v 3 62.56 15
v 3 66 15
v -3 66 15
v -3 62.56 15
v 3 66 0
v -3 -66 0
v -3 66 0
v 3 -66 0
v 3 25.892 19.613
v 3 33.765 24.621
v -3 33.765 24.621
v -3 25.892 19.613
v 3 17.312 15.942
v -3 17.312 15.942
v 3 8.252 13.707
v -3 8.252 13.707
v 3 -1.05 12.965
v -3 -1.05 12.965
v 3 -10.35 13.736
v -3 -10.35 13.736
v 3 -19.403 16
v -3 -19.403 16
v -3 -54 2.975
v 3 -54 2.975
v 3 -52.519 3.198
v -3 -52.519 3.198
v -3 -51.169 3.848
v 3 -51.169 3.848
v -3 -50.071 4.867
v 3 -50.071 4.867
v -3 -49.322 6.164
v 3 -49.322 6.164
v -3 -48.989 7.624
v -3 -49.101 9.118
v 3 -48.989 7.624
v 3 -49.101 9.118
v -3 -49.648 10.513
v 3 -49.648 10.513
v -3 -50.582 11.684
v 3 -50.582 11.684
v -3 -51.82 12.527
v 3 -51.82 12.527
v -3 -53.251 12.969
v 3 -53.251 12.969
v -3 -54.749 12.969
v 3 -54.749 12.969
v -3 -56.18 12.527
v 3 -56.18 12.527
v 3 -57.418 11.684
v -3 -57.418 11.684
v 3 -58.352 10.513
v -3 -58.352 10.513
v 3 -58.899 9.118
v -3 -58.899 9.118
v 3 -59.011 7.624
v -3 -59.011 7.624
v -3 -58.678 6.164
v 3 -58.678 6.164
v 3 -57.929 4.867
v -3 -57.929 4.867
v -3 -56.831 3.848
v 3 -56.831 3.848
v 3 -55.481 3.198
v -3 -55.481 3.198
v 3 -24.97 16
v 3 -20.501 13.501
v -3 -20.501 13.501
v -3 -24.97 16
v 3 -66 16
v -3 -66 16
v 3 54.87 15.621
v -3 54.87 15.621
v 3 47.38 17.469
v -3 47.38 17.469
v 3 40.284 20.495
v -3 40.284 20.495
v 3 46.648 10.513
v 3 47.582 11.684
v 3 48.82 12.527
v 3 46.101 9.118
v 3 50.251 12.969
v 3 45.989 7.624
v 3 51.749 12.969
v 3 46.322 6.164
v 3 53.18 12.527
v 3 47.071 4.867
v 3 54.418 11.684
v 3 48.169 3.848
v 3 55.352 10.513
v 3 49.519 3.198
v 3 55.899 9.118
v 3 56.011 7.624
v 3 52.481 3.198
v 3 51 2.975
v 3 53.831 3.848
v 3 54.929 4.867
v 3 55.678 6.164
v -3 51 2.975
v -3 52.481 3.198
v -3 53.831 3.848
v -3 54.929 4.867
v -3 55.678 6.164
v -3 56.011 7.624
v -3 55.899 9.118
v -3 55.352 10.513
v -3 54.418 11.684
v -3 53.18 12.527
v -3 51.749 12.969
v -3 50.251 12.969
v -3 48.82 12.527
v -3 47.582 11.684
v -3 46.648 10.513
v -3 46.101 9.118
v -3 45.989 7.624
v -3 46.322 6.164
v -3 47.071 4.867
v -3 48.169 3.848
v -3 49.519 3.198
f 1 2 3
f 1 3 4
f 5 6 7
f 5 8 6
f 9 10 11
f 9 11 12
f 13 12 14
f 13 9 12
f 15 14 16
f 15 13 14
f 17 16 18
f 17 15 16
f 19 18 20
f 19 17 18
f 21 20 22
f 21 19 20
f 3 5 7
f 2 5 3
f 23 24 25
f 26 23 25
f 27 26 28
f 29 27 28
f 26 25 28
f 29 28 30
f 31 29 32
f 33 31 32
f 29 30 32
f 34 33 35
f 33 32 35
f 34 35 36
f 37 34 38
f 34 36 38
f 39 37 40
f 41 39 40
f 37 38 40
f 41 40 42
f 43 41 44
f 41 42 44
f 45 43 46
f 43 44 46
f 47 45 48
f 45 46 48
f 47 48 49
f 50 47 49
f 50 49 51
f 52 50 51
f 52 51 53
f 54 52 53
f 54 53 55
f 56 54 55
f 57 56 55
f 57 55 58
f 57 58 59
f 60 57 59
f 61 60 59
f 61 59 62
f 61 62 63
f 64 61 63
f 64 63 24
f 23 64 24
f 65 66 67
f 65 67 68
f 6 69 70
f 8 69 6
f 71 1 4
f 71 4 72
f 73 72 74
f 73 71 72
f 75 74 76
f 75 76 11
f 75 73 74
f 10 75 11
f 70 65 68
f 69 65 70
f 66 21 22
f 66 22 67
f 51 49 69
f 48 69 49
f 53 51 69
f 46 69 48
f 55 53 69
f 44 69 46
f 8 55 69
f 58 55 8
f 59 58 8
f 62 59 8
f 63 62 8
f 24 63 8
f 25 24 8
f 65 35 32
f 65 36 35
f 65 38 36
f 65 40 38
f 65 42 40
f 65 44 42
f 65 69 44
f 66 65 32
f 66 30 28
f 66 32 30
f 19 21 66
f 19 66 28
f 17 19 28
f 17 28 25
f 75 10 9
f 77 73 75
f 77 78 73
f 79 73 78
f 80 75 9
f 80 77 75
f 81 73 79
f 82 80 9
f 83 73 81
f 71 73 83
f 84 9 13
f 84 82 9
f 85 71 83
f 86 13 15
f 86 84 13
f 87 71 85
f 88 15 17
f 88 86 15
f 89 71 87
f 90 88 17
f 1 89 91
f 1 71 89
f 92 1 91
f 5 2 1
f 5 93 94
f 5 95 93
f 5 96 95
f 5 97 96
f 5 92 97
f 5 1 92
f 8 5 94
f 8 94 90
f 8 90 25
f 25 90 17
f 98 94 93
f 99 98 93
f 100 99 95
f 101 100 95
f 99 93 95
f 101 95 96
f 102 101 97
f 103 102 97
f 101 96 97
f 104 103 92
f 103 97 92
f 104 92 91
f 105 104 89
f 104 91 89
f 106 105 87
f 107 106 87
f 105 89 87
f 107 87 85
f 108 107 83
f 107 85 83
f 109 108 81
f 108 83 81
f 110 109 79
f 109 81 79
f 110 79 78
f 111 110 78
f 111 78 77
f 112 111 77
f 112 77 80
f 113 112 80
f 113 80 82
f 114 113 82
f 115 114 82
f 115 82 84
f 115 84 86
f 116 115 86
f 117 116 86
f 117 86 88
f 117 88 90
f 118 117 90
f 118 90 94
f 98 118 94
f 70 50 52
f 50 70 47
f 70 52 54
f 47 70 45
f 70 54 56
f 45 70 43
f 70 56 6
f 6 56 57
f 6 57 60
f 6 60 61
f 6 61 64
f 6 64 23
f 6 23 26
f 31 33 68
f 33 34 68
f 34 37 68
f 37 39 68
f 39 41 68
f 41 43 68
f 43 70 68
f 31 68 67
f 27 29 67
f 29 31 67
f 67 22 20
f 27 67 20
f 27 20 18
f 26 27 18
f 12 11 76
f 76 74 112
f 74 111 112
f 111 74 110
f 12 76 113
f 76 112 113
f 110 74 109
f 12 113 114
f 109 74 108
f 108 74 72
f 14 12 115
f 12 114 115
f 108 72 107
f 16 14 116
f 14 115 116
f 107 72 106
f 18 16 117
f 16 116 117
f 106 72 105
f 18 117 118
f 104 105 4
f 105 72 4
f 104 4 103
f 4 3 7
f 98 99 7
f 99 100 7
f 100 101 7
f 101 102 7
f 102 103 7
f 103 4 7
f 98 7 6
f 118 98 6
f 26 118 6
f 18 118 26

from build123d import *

# Parameters (mm, degrees)
BOSS_EXTRUDE1_DEPTH = 3
SKETCH3_R           = 5.025
CUT_EXTRUDE1_DEPTH  = 71.697893831


with BuildPart() as part:
    # Sketch1 → Boss-Extrude1 (new, symmetric)
    with BuildSketch(Plane(origin=(0, 0, 0), x_dir=(0, 0, -1), z_dir=(1, 0, 0))):
        with BuildLine():
            Line((0, 66), (-15, 66))
            Line((-15, 66), (-15, 62.56))
            ThreePointArc((-15, 62.56), (-17.468868001, 47.38033448), (-24.620970576, 33.765453531))
            ThreePointArc((-24.620970576, 33.765453531), (-13.706982887, 8.251900539), (-16, -19.403091525))
            Line((-16, -19.403091525), (-13.500700251, -20.50145429))
            Line((-13.500700251, -20.50145429), (-16, -24.97))
            Line((-16, -24.97), (-16, -66))
            Line((-16, -66), (0, -66))
            Line((0, -66), (0, 66))
        make_face()
    extrude(amount=BOSS_EXTRUDE1_DEPTH, both=True)

    # Sketch3 → Cut-Extrude1 (cut, through all)
    with BuildSketch(Plane(origin=(3, 0, 0), x_dir=(0, 0, -1), z_dir=(1, 0, 0))):
        with Locations((-8, 51)):
            Circle(SKETCH3_R)
        with Locations((-8, -54)):
            Circle(SKETCH3_R)
    extrude(amount=-CUT_EXTRUDE1_DEPTH, mode=Mode.SUBTRACT)


solid = part.part
